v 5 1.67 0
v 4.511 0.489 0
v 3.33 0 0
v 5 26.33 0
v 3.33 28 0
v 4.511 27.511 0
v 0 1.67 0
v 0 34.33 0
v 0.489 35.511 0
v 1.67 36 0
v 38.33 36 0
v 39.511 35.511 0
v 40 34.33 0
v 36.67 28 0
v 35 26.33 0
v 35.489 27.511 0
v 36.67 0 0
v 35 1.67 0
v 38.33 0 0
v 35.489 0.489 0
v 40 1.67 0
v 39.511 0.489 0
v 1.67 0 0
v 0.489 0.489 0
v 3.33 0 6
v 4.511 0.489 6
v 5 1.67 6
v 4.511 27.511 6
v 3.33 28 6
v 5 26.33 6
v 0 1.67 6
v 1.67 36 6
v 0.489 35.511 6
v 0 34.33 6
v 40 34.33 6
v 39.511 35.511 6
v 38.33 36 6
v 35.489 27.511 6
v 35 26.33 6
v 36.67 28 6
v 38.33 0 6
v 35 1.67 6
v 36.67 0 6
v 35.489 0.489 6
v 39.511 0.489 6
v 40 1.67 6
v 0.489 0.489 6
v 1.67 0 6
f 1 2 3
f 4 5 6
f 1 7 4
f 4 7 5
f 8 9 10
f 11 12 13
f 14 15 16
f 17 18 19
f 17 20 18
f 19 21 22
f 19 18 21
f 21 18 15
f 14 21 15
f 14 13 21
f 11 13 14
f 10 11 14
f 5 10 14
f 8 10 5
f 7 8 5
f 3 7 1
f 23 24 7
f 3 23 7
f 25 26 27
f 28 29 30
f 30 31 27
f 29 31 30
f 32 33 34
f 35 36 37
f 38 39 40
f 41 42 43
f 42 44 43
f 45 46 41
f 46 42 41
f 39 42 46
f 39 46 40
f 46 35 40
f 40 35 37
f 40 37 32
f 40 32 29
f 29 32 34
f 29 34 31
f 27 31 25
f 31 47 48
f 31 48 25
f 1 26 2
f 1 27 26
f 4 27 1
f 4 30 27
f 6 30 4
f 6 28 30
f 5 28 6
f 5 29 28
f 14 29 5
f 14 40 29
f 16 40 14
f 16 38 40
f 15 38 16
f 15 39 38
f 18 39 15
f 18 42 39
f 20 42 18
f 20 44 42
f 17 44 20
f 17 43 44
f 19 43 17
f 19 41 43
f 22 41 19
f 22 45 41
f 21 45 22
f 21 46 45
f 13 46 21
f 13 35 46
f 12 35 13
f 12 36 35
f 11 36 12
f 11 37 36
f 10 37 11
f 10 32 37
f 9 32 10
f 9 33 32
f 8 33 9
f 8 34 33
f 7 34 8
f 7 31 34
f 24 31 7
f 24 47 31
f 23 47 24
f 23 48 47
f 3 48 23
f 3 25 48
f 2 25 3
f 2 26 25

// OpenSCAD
$fn = 32;

// ----------------------------------------------------------------------
// Clip blank: staple clip, 6 mm thick
// ----------------------------------------------------------------------

// --- parameters (mm) ---
profile_height = 6;       // extrusion height
profile_points = 24;      // points of the closed outline

profile = [[0, 1.67], [0.489, 0.489], [1.67, 0], [3.33, 0], [4.511, 0.489], [5, 1.67], [5, 26.33], [4.511, 27.511], [3.33, 28], [36.67, 28], [35.489, 27.511], [35, 26.33], [35, 1.67], [35.489, 0.489], [36.67, 0], [38.33, 0], [39.511, 0.489], [40, 1.67], [40, 34.33], [39.511, 35.511], [38.33, 36], [1.67, 36], [0.489, 35.511], [0, 34.33]];  // single closed polygon, 24 points, counter clockwise

// --- the one profile operation ---
linear_extrude(height = profile_height) polygon(points = profile);
